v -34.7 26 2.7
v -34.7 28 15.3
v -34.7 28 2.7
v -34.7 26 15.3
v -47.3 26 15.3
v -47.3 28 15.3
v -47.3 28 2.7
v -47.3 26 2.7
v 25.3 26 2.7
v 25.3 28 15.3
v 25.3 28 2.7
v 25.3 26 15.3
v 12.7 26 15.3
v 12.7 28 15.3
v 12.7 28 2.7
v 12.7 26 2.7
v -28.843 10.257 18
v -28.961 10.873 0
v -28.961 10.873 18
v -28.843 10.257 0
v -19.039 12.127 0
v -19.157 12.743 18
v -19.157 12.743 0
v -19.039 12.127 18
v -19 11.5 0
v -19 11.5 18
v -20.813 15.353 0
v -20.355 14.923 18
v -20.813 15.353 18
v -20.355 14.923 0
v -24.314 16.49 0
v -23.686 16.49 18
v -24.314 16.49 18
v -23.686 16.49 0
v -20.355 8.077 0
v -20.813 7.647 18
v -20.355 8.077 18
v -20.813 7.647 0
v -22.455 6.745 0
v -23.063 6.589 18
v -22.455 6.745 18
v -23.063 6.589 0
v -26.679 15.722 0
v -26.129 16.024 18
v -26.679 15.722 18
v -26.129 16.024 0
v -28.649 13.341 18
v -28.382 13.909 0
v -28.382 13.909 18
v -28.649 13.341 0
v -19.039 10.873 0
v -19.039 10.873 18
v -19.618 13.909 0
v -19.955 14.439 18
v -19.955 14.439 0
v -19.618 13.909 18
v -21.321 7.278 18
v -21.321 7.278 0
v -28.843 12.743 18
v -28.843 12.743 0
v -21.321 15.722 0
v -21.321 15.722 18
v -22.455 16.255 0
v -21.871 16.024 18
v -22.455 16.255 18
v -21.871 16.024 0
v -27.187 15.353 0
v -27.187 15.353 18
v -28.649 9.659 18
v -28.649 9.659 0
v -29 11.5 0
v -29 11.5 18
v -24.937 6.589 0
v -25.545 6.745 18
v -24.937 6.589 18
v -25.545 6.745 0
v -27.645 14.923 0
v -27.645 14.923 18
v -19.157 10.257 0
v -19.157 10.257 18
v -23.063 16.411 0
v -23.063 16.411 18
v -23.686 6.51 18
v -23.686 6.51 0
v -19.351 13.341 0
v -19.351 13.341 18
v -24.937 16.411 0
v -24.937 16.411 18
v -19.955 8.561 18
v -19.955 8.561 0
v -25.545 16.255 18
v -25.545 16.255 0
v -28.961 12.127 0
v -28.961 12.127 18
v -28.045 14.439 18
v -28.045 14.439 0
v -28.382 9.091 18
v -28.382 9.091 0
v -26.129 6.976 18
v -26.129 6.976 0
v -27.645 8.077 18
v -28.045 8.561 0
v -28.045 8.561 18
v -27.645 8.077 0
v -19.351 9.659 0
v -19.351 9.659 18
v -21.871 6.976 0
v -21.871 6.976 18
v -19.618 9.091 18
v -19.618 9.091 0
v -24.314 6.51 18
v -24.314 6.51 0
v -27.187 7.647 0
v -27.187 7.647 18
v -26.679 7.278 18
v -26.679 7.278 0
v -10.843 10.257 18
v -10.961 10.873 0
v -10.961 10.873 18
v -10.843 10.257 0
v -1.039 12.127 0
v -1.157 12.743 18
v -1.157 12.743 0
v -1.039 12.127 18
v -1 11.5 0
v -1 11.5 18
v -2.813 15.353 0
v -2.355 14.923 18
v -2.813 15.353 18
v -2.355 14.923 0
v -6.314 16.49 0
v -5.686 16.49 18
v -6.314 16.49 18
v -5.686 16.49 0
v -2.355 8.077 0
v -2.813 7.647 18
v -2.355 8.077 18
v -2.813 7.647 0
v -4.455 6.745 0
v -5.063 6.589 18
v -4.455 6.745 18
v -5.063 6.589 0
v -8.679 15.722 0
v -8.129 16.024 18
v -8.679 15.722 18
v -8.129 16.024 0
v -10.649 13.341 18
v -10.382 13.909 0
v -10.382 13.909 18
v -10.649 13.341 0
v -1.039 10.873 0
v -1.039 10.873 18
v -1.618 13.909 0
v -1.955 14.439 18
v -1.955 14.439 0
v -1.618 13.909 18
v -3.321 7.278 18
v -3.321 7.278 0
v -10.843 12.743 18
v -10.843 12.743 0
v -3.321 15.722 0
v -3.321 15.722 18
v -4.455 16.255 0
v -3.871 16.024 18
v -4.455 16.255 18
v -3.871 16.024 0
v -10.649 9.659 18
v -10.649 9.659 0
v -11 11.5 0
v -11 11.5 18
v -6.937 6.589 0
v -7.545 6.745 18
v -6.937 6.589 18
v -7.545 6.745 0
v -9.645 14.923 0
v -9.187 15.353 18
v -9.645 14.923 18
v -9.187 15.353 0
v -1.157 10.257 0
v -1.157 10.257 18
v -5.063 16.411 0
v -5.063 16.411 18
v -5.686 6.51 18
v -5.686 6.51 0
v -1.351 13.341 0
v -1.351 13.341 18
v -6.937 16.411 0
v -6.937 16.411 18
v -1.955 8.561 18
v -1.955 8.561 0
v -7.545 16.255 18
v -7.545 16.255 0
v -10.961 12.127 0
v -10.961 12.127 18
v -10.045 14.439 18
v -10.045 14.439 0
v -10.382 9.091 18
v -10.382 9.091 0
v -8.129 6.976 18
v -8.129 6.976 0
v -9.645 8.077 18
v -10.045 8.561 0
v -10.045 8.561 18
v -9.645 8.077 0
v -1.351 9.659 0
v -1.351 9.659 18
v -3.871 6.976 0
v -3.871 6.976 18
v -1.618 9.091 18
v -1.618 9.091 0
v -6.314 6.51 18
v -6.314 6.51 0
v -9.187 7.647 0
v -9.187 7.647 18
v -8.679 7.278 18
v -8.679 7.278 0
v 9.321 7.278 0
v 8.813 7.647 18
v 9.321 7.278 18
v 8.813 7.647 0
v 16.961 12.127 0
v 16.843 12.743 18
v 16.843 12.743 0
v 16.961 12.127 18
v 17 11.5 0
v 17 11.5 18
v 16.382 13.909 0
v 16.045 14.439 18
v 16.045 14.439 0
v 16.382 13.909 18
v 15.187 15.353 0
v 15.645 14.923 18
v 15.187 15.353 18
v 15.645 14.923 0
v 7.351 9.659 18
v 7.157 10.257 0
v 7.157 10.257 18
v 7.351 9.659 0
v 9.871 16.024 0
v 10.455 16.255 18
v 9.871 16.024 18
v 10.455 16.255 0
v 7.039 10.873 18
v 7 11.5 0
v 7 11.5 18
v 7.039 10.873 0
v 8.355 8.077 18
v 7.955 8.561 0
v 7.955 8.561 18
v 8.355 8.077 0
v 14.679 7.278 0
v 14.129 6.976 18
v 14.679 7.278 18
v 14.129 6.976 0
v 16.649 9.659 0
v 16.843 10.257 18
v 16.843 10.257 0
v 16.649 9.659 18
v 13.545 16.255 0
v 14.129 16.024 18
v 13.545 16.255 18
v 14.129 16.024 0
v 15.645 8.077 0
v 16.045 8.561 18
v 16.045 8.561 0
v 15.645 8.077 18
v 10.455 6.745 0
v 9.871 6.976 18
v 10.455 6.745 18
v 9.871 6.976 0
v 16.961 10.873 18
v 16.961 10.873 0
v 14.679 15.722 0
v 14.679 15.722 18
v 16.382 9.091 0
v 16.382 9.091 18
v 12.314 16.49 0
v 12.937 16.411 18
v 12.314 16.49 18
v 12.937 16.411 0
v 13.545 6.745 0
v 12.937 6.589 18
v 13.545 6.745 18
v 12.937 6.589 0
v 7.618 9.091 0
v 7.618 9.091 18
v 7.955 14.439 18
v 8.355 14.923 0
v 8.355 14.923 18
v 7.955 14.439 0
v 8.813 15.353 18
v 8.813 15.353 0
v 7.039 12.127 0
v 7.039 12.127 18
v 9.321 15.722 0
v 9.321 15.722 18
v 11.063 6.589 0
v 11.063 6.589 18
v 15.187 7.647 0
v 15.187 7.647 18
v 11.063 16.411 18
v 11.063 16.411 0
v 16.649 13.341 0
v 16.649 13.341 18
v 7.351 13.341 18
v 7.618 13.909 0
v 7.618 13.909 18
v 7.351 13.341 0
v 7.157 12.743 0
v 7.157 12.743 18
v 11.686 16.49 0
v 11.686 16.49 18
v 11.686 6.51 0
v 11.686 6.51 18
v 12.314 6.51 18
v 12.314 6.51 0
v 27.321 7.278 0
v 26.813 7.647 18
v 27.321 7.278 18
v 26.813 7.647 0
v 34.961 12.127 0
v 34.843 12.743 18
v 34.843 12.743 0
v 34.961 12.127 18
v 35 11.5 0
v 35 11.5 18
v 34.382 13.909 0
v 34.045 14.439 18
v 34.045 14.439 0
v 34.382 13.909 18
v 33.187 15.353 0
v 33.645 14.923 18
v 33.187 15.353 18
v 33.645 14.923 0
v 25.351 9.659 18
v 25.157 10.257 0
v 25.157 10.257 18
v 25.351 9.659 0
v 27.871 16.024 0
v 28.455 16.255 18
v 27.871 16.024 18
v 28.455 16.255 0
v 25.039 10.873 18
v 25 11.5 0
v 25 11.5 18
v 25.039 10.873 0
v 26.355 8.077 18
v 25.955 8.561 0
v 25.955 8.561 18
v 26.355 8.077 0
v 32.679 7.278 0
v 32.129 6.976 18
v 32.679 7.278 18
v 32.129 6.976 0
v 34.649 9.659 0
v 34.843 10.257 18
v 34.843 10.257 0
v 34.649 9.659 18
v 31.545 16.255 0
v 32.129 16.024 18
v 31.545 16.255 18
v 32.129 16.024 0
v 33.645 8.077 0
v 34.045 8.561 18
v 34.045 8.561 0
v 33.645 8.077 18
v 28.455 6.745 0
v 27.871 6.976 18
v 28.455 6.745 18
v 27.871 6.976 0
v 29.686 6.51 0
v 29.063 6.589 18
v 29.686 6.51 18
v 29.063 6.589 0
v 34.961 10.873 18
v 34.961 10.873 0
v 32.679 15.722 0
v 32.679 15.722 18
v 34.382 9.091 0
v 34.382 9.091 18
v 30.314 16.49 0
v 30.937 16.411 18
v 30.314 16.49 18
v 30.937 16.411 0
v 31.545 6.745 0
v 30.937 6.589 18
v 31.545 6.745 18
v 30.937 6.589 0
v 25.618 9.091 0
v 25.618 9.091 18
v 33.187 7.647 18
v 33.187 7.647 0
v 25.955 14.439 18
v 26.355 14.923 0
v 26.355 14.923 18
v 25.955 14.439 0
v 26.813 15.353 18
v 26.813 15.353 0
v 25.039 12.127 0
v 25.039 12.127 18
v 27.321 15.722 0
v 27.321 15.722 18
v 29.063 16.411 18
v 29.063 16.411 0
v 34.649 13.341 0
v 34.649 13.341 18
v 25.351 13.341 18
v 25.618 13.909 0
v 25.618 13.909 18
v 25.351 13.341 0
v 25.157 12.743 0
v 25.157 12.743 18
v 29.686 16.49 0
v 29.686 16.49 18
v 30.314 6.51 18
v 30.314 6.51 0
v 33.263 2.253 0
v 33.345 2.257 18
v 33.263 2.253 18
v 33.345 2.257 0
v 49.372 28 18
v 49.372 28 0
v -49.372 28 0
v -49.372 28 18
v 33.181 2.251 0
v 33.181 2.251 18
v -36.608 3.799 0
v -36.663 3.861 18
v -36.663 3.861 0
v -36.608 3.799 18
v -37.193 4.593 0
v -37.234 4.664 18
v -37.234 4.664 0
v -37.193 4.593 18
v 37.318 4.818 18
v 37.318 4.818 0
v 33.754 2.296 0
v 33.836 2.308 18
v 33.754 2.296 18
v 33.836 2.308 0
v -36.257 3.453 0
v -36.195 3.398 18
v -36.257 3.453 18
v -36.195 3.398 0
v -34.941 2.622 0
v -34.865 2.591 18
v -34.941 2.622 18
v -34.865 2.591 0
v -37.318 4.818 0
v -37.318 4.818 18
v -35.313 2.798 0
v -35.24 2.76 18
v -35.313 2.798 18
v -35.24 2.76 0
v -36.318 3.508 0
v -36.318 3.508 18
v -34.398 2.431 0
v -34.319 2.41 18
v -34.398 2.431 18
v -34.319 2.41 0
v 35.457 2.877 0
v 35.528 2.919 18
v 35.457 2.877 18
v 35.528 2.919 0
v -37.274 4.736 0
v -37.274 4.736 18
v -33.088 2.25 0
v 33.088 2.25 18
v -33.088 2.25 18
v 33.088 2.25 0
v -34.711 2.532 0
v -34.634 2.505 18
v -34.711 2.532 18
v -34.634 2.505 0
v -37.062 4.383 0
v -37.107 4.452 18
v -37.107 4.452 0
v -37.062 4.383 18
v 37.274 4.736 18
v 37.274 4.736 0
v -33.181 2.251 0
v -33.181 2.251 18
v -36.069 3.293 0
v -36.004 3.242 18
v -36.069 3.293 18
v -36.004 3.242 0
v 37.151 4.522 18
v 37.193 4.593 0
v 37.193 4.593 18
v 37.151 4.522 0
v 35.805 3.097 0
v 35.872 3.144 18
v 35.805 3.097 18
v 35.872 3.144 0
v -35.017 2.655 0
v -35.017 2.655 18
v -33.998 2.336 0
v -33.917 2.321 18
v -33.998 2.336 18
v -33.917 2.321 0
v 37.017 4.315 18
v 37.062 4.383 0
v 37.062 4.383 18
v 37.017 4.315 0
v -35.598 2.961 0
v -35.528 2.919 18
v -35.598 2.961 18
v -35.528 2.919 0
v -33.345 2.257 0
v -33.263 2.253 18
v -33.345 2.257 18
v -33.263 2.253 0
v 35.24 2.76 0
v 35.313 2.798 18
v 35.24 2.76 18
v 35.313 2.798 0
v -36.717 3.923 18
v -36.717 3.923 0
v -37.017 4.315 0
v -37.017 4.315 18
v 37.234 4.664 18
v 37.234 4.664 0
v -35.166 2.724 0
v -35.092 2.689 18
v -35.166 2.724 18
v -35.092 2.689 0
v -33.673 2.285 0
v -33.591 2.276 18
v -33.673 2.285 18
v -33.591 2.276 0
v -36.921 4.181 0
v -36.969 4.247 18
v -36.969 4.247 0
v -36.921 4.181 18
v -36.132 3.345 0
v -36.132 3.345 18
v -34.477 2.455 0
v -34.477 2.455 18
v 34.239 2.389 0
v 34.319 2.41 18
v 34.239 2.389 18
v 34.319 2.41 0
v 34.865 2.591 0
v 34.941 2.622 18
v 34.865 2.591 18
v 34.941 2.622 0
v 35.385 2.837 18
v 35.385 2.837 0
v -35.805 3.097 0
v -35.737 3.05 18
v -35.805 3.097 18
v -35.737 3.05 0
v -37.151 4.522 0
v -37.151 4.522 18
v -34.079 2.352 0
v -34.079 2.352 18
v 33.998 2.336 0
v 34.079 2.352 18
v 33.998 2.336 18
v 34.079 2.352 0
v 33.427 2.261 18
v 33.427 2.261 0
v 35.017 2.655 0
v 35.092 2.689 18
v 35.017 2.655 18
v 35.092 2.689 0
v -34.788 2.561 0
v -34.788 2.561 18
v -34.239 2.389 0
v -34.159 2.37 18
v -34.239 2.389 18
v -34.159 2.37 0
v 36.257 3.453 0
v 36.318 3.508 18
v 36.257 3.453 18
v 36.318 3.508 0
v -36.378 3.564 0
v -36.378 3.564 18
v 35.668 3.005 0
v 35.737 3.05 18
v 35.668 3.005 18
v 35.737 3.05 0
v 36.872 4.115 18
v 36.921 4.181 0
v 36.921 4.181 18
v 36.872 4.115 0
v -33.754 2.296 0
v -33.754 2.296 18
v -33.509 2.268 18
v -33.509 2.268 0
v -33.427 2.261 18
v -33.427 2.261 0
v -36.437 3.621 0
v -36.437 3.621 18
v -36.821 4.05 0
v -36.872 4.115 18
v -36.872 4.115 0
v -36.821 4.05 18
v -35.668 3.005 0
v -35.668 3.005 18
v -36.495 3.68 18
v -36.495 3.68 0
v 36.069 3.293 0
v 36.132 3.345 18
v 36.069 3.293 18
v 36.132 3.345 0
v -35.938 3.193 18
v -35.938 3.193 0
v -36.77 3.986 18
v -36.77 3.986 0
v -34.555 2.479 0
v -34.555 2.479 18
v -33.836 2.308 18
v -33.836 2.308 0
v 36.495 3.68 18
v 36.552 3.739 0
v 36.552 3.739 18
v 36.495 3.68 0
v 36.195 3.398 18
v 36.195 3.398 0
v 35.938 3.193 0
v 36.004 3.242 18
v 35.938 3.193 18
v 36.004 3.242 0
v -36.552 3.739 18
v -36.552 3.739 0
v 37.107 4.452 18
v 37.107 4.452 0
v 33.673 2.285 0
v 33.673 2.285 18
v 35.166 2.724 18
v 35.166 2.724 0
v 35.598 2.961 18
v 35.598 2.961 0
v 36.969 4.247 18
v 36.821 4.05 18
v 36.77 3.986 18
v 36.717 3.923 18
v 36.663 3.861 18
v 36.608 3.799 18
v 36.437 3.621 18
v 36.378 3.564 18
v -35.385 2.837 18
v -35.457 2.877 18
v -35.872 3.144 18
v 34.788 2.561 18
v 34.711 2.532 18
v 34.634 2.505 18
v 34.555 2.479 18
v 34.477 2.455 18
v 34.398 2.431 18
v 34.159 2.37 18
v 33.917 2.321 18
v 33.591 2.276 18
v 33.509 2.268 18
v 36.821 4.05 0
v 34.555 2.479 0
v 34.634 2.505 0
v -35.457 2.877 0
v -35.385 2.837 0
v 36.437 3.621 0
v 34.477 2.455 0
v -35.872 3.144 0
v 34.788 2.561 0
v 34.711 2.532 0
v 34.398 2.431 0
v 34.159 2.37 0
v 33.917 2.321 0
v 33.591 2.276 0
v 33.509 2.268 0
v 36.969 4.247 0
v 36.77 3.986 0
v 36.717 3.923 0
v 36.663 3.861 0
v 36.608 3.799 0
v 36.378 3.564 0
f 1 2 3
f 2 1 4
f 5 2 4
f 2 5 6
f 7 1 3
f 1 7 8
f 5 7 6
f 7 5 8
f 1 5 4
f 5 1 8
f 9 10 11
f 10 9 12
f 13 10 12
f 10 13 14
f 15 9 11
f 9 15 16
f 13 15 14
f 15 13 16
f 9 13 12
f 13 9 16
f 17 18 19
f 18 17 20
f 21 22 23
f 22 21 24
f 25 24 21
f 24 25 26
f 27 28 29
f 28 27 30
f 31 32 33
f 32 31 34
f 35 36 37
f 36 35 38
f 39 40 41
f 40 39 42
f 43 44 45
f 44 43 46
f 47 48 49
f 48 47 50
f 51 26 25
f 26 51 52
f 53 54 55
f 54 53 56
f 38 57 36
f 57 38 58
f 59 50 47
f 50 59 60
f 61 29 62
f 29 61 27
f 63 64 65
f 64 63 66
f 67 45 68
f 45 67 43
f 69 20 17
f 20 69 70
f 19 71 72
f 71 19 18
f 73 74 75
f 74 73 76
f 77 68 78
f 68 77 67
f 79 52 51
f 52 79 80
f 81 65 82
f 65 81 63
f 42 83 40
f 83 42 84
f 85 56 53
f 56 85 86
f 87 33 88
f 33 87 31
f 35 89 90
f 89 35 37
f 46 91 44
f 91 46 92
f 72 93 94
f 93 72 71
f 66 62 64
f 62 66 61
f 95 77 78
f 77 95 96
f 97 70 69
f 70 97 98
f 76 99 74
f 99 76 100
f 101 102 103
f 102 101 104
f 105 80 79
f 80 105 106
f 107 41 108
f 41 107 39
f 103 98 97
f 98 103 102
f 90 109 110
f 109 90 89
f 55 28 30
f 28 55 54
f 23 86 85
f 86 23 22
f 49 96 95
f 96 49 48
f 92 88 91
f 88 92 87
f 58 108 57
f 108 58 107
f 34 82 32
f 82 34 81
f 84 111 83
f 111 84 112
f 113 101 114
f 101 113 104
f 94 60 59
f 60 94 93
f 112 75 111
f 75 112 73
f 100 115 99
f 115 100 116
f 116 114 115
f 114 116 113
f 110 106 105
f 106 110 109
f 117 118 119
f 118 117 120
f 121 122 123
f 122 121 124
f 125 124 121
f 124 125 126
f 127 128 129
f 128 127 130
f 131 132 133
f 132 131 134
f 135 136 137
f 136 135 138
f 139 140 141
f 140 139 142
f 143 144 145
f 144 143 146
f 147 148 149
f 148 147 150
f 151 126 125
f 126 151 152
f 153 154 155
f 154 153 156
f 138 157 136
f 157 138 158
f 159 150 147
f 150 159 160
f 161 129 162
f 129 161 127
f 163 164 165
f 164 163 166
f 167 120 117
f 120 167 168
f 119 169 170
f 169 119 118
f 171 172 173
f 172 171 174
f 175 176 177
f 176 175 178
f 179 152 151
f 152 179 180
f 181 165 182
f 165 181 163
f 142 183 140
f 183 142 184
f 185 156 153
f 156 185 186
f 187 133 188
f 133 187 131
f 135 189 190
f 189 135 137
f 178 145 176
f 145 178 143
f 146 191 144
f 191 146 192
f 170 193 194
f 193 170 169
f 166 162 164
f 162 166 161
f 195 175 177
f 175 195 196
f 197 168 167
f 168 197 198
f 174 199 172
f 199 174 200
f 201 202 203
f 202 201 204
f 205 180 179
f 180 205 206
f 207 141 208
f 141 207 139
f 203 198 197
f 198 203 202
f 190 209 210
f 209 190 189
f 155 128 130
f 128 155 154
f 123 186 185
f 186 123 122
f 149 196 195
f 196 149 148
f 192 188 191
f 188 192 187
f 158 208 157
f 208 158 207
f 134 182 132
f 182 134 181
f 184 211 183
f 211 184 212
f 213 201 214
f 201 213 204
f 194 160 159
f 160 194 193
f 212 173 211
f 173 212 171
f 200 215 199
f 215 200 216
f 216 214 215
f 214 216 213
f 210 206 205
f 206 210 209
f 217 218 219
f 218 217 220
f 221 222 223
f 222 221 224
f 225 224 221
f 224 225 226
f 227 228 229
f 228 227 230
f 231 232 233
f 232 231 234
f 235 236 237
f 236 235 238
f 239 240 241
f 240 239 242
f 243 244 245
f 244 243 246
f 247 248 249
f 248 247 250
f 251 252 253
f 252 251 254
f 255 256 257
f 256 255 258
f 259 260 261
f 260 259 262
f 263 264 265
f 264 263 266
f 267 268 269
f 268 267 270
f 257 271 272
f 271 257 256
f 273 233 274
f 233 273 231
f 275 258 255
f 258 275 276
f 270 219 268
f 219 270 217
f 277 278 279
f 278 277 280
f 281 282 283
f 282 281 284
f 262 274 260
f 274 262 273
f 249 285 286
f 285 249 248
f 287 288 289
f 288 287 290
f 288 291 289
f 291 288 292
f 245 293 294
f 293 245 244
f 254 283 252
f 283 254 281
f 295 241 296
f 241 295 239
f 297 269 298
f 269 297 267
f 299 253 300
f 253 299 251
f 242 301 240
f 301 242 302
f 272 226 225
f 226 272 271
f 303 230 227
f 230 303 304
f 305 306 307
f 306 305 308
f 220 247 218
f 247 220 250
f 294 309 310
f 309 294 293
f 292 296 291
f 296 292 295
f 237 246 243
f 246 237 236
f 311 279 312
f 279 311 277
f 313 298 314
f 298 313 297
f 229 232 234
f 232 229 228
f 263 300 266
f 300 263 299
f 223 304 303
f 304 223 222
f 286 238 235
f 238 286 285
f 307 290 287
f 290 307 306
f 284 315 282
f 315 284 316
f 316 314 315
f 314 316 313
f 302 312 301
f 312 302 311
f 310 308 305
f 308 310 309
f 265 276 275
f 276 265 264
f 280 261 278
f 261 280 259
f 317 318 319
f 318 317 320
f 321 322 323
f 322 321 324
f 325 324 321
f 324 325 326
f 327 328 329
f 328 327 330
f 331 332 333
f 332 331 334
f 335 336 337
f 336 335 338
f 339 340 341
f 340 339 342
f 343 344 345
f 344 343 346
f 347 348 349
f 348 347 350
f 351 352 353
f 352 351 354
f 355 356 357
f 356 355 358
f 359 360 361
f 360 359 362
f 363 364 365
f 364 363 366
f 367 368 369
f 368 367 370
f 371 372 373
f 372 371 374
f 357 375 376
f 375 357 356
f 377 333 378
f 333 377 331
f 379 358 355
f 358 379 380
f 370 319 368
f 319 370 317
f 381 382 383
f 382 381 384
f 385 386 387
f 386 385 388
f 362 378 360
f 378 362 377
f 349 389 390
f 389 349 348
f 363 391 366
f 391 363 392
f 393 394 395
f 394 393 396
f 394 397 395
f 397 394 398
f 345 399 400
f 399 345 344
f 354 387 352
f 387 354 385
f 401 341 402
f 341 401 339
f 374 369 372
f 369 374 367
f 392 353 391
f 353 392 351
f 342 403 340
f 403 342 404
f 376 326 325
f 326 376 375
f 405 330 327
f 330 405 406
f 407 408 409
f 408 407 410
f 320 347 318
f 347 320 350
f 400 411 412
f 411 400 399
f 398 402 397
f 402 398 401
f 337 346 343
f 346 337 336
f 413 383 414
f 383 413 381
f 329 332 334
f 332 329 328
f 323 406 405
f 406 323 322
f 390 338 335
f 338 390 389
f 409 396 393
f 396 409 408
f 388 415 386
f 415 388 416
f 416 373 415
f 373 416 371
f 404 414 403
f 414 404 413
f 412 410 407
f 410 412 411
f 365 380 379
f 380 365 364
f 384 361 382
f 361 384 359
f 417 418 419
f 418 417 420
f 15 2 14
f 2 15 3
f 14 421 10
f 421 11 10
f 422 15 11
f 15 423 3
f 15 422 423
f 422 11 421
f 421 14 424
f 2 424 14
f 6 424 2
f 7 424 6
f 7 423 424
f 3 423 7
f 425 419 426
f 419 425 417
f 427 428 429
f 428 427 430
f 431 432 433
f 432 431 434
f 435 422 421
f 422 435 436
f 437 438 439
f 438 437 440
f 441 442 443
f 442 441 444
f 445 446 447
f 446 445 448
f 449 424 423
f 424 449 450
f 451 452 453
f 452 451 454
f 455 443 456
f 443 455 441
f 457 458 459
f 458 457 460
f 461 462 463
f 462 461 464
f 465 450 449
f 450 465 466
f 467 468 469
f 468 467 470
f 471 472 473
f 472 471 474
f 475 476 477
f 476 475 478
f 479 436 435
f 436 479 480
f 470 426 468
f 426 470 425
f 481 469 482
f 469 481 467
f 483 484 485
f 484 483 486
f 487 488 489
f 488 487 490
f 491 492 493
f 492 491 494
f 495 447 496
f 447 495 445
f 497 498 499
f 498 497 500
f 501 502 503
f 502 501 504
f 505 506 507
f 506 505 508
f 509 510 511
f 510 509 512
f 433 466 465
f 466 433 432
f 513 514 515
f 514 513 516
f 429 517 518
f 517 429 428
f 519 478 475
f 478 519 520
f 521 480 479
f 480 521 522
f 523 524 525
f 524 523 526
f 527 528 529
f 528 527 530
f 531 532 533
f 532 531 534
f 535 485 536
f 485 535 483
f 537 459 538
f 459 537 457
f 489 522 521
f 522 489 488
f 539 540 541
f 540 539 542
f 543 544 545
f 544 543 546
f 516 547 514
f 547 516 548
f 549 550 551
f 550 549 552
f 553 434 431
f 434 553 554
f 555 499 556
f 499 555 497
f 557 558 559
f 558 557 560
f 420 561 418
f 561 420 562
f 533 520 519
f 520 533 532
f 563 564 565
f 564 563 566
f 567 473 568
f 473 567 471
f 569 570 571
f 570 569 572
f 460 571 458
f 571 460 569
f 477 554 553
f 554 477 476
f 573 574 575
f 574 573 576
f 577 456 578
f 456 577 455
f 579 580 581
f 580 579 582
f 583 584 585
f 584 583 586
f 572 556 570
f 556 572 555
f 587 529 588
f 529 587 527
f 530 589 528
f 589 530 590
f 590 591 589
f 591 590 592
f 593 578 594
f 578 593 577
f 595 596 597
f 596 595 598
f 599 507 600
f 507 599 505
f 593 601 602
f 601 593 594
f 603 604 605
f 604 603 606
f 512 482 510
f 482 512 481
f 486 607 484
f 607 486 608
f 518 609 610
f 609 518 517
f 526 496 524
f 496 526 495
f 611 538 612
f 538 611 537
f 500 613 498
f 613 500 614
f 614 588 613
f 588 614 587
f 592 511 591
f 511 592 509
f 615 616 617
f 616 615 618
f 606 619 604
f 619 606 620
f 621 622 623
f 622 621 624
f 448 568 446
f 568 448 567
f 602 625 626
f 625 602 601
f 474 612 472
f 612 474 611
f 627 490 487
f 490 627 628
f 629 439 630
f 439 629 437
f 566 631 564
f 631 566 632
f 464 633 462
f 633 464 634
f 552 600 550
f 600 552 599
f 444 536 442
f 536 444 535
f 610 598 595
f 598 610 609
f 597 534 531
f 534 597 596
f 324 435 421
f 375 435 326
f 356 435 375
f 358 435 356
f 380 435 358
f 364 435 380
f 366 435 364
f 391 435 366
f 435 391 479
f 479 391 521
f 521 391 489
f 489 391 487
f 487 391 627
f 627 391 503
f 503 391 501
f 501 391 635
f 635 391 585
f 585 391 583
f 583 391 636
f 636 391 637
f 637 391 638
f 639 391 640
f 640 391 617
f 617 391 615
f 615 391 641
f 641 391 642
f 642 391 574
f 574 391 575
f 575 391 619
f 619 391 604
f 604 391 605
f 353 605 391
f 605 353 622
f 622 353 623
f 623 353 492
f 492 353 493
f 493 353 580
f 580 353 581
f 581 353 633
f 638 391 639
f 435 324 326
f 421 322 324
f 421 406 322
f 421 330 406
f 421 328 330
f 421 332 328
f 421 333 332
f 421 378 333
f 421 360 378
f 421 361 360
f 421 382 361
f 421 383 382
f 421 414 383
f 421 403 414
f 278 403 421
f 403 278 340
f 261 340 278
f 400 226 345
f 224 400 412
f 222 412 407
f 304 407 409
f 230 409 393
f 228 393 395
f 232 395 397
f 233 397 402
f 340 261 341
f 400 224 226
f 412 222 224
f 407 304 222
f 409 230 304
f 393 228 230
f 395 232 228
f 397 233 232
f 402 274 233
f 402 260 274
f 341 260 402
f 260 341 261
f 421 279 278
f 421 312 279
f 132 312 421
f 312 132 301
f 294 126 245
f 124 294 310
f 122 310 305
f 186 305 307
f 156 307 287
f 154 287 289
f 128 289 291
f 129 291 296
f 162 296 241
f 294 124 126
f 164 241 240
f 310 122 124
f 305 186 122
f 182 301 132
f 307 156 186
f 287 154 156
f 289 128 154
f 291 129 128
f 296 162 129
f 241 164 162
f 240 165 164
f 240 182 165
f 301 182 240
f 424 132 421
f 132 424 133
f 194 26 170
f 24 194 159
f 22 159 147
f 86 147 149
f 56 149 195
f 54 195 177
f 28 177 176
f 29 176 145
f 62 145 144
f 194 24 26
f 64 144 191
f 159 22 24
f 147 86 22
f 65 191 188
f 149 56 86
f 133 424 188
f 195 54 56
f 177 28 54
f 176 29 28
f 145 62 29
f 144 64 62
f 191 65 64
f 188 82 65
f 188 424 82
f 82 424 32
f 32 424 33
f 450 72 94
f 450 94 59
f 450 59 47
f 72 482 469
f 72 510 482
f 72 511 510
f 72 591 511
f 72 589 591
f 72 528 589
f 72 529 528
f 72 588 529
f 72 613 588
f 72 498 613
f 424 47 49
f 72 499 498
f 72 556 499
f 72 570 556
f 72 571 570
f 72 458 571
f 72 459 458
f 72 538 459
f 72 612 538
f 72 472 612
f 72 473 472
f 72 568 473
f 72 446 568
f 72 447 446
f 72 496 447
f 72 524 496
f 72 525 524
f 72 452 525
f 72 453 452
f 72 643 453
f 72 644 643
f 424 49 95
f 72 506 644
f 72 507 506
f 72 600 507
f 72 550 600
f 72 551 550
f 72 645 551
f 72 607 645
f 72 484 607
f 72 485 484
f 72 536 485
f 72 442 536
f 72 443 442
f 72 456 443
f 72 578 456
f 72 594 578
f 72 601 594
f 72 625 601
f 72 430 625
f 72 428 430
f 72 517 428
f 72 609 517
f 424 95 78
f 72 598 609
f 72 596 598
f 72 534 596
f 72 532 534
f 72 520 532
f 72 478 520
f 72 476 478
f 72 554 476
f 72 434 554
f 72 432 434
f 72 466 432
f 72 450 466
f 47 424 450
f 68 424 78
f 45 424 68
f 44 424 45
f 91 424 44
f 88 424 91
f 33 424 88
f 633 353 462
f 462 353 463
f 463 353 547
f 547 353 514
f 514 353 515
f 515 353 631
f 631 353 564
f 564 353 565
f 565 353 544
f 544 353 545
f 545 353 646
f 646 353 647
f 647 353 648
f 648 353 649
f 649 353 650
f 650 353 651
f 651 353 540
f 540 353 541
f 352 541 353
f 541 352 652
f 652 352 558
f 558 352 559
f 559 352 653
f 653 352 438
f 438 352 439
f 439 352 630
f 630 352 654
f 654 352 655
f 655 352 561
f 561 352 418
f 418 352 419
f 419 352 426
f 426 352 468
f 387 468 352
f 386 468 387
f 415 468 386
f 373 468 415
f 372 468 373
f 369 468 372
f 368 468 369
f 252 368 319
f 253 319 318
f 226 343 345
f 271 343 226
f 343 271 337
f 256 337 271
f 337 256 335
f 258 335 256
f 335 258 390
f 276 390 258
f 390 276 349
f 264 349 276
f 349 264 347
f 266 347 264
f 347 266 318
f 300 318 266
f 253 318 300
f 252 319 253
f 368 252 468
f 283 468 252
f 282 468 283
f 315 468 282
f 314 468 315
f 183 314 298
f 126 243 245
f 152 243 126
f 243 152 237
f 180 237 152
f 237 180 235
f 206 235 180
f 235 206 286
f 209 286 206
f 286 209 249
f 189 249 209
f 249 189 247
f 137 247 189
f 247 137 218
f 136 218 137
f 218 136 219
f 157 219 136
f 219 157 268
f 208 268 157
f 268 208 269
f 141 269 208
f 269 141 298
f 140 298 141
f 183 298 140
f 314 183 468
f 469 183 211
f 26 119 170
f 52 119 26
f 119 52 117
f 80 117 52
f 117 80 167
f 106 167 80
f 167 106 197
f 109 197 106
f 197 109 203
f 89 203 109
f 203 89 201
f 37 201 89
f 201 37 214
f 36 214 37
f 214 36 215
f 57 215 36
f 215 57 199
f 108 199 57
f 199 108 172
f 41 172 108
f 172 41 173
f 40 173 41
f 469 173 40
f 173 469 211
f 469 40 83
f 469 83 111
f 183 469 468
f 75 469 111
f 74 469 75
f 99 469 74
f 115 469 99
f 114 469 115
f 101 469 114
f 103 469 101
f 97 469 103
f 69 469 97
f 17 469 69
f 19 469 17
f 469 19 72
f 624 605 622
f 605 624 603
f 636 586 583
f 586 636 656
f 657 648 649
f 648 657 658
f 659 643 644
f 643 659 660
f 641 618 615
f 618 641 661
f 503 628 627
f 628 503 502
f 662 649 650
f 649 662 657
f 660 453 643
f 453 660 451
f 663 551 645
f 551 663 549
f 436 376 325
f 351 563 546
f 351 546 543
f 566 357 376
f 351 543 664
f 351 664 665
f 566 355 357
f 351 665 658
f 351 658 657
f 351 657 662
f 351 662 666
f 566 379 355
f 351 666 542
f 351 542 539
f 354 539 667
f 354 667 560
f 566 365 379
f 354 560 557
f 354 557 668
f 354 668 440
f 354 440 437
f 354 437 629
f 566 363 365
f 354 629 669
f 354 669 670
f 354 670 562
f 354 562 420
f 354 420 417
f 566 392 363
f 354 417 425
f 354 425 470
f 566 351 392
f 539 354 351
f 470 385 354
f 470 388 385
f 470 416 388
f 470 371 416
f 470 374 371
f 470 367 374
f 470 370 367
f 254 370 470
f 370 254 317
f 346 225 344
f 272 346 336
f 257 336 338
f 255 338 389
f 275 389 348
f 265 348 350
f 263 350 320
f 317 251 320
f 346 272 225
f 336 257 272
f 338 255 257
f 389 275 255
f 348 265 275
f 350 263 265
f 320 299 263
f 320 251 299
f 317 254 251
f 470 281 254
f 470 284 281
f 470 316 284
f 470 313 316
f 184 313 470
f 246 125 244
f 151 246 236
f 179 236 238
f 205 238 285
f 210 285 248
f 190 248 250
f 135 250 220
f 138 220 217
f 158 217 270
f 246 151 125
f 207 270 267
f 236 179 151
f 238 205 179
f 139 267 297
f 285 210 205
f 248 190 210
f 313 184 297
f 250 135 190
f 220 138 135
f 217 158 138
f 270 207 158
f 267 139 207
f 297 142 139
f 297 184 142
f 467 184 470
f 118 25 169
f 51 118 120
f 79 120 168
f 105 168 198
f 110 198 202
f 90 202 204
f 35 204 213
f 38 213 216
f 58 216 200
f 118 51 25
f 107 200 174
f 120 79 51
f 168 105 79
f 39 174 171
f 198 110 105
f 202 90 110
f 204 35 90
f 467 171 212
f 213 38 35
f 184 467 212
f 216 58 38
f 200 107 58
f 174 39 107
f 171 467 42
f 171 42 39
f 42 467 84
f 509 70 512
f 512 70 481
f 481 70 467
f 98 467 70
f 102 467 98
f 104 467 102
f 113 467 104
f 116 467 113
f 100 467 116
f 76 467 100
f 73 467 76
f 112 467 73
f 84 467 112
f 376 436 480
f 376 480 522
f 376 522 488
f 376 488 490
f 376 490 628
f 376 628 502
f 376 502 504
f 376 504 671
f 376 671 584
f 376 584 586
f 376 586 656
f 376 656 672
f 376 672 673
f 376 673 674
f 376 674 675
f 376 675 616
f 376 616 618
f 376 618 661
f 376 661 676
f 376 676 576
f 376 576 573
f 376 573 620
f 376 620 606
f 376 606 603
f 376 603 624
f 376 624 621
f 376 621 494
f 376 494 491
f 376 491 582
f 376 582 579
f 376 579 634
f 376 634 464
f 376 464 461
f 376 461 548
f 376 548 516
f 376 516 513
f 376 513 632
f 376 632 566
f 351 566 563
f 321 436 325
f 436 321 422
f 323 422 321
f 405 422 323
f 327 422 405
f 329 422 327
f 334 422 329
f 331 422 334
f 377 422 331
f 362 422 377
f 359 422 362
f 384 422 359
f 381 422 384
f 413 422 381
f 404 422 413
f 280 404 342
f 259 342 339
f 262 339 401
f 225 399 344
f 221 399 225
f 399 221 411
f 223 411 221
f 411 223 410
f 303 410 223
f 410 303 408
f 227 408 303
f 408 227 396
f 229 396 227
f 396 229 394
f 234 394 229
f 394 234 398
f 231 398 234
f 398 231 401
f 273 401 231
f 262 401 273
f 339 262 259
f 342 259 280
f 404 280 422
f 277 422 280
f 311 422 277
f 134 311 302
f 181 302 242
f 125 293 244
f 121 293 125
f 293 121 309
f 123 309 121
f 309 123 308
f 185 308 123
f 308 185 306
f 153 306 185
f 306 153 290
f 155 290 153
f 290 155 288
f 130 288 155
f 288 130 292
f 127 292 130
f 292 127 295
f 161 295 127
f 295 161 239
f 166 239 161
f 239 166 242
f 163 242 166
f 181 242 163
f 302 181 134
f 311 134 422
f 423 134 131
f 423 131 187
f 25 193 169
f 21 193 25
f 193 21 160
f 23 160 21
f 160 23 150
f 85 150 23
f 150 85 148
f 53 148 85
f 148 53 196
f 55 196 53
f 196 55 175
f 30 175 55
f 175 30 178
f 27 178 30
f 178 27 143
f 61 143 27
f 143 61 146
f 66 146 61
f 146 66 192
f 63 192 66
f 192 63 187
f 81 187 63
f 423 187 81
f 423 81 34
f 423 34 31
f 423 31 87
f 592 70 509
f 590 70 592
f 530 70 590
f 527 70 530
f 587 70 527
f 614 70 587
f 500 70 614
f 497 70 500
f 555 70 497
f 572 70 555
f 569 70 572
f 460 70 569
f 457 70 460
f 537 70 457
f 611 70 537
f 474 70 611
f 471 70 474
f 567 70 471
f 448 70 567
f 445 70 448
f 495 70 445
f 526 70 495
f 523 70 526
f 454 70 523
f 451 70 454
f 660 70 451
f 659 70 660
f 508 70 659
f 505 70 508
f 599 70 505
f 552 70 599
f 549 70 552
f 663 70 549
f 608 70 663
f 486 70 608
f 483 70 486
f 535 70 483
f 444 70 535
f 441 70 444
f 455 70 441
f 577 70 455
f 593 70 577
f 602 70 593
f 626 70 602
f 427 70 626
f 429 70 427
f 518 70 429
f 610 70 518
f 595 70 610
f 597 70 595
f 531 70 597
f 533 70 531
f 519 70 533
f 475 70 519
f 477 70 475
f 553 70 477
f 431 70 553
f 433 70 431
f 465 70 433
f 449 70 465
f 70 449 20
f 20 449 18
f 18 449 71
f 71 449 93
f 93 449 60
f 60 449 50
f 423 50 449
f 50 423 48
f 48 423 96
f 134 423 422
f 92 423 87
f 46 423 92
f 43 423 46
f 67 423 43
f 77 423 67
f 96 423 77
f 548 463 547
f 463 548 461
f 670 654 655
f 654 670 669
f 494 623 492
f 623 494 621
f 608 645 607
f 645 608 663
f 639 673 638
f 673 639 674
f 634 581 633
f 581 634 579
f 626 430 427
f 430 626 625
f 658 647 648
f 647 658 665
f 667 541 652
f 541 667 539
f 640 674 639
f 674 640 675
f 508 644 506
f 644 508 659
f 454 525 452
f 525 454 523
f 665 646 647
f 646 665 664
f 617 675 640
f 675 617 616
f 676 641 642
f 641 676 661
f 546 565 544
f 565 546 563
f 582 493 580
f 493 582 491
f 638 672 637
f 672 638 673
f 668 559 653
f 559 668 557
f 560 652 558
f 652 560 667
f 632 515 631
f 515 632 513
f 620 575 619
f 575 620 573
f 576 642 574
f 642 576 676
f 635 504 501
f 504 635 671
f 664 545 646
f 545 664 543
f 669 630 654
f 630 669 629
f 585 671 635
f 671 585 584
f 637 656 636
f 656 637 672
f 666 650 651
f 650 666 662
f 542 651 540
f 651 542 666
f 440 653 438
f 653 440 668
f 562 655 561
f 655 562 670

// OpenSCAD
$fn = 50;

difference() {
	union() {
		linear_extrude(height = 18.0) {
			polygon(points = [[37.3176529, 4.8181797], [37.2739859, 4.7359524], [37.2341439, 4.6639664], [37.193061, 4.5926813], [37.1507496, 4.5221185], [37.1072223, 4.4522992], [37.0624922, 4.3832442], [37.0165727, 4.3149744], [36.9694776, 4.2475102], [36.921221, 4.1808718], [36.8718174, 4.1150793], [36.8212816, 4.0501524], [36.7696288, 3.9861106], [36.7168745, 3.922973], [36.6630345, 3.8607587], [36.608125, 3.7994863], [36.5521624, 3.7391741], [36.4951635, 3.6798403], [36.4371454, 3.6215028], [36.3781256, 3.5641788], [36.3181218, 3.5078858], [36.2571519, 3.4526405], [36.1952342, 3.3984596], [36.1323874, 3.3453593], [36.0686302, 3.2933555], [36.0039819, 3.2424639], [35.9384617, 3.1926997], [35.8720894, 3.1440778], [35.8048849, 3.0966128], [35.7368684, 3.050319], [35.6680601, 3.0052103], [35.5984809, 2.9613002], [35.5281516, 2.9186018], [35.4570932, 2.877128], [35.3853271, 2.8368912], [35.3128749, 2.7979036], [35.2397582, 2.7601767], [35.165999, 2.7237219], [35.0916194, 2.6885502], [35.0166418, 2.6546721], [34.9410886, 2.6220977], [34.8649826, 2.590837], [34.7883465, 2.5608991], [34.7112033, 2.5322931], [34.6335763, 2.5050276], [34.5554886, 2.4791108], [34.4769637, 2.4545504], [34.3980252, 2.4313539], [34.3186967, 2.4095281], [34.2390021, 2.3890796], [34.1589653, 2.3700146], [34.0786103, 2.3523388], [33.9979611, 2.3360574], [33.917042, 2.3211755], [33.8358773, 2.3076973], [33.7544914, 2.295627], [33.6729085, 2.2849683], [33.5911533, 2.2757242], [33.5092503, 2.2678976], [33.4272239, 2.2614908], [33.3450989, 2.2565057], [33.2628999, 2.2529439], [33.1806515, 2.2508063], [33.0875521, 2.25], [-33.0875521, 2.25], [-33.1806515, 2.2508063], [-33.2628999, 2.2529439], [-33.3450989, 2.2565057], [-33.4272239, 2.2614908], [-33.5092503, 2.2678976], [-33.5911533, 2.2757242], [-33.6729085, 2.2849683], [-33.7544914, 2.295627], [-33.8358773, 2.3076973], [-33.917042, 2.3211755], [-33.9979611, 2.3360574], [-34.0786103, 2.3523388], [-34.1589653, 2.3700146], [-34.2390021, 2.3890796], [-34.3186967, 2.4095281], [-34.3980252, 2.4313539], [-34.4769637, 2.4545504], [-34.5554886, 2.4791108], [-34.6335763, 2.5050276], [-34.7112033, 2.5322931], [-34.7883465, 2.5608991], [-34.8649826, 2.590837], [-34.9410886, 2.6220977], [-35.0166418, 2.6546721], [-35.0916194, 2.6885502], [-35.165999, 2.7237219], [-35.2397582, 2.7601767], [-35.3128749, 2.7979036], [-35.3853271, 2.8368912], [-35.4570932, 2.877128], [-35.5281516, 2.9186018], [-35.5984809, 2.9613002], [-35.6680601, 3.0052103], [-35.7368684, 3.050319], [-35.8048849, 3.0966128], [-35.8720894, 3.1440778], [-35.9384617, 3.1926997], [-36.0039819, 3.2424639], [-36.0686302, 3.2933555], [-36.1323874, 3.3453593], [-36.1952342, 3.3984596], [-36.2571519, 3.4526405], [-36.3181218, 3.5078858], [-36.3781256, 3.5641788], [-36.4371454, 3.6215028], [-36.4951635, 3.6798403], [-36.5521624, 3.7391741], [-36.608125, 3.7994863], [-36.6630345, 3.8607587], [-36.7168745, 3.922973], [-36.7696288, 3.9861106], [-36.8212816, 4.0501524], [-36.8718174, 4.1150793], [-36.921221, 4.1808718], [-36.9694776, 4.2475102], [-37.0165727, 4.3149744], [-37.0624922, 4.3832442], [-37.1072223, 4.4522992], [-37.1507496, 4.5221185], [-37.193061, 4.5926813], [-37.2341439, 4.6639664], [-37.2739859, 4.7359524], [-37.3176529, 4.8181797], [-49.3721994, 28.0], [49.3721994, 28.0]]);
		}
	}
	union() {
		translate(v = [-47.3, 26.0, 2.7]) {
			cube(size = [12.6, 4.0, 12.6]);
		}
		translate(v = [12.7, 26.0, 2.7]) {
			cube(size = [12.6, 4.0, 12.6]);
		}
		translate(v = [-24.0, 11.5, -0.01]) {
			cylinder(h = 18.02, r = 5.0);
		}
		translate(v = [-6.0, 11.5, -0.01]) {
			cylinder(h = 18.02, r = 5.0);
		}
		translate(v = [12.0, 11.5, -0.01]) {
			cylinder(h = 18.02, r = 5.0);
		}
		translate(v = [30.0, 11.5, -0.01]) {
			cylinder(h = 18.02, r = 5.0);
		}
	}
}
